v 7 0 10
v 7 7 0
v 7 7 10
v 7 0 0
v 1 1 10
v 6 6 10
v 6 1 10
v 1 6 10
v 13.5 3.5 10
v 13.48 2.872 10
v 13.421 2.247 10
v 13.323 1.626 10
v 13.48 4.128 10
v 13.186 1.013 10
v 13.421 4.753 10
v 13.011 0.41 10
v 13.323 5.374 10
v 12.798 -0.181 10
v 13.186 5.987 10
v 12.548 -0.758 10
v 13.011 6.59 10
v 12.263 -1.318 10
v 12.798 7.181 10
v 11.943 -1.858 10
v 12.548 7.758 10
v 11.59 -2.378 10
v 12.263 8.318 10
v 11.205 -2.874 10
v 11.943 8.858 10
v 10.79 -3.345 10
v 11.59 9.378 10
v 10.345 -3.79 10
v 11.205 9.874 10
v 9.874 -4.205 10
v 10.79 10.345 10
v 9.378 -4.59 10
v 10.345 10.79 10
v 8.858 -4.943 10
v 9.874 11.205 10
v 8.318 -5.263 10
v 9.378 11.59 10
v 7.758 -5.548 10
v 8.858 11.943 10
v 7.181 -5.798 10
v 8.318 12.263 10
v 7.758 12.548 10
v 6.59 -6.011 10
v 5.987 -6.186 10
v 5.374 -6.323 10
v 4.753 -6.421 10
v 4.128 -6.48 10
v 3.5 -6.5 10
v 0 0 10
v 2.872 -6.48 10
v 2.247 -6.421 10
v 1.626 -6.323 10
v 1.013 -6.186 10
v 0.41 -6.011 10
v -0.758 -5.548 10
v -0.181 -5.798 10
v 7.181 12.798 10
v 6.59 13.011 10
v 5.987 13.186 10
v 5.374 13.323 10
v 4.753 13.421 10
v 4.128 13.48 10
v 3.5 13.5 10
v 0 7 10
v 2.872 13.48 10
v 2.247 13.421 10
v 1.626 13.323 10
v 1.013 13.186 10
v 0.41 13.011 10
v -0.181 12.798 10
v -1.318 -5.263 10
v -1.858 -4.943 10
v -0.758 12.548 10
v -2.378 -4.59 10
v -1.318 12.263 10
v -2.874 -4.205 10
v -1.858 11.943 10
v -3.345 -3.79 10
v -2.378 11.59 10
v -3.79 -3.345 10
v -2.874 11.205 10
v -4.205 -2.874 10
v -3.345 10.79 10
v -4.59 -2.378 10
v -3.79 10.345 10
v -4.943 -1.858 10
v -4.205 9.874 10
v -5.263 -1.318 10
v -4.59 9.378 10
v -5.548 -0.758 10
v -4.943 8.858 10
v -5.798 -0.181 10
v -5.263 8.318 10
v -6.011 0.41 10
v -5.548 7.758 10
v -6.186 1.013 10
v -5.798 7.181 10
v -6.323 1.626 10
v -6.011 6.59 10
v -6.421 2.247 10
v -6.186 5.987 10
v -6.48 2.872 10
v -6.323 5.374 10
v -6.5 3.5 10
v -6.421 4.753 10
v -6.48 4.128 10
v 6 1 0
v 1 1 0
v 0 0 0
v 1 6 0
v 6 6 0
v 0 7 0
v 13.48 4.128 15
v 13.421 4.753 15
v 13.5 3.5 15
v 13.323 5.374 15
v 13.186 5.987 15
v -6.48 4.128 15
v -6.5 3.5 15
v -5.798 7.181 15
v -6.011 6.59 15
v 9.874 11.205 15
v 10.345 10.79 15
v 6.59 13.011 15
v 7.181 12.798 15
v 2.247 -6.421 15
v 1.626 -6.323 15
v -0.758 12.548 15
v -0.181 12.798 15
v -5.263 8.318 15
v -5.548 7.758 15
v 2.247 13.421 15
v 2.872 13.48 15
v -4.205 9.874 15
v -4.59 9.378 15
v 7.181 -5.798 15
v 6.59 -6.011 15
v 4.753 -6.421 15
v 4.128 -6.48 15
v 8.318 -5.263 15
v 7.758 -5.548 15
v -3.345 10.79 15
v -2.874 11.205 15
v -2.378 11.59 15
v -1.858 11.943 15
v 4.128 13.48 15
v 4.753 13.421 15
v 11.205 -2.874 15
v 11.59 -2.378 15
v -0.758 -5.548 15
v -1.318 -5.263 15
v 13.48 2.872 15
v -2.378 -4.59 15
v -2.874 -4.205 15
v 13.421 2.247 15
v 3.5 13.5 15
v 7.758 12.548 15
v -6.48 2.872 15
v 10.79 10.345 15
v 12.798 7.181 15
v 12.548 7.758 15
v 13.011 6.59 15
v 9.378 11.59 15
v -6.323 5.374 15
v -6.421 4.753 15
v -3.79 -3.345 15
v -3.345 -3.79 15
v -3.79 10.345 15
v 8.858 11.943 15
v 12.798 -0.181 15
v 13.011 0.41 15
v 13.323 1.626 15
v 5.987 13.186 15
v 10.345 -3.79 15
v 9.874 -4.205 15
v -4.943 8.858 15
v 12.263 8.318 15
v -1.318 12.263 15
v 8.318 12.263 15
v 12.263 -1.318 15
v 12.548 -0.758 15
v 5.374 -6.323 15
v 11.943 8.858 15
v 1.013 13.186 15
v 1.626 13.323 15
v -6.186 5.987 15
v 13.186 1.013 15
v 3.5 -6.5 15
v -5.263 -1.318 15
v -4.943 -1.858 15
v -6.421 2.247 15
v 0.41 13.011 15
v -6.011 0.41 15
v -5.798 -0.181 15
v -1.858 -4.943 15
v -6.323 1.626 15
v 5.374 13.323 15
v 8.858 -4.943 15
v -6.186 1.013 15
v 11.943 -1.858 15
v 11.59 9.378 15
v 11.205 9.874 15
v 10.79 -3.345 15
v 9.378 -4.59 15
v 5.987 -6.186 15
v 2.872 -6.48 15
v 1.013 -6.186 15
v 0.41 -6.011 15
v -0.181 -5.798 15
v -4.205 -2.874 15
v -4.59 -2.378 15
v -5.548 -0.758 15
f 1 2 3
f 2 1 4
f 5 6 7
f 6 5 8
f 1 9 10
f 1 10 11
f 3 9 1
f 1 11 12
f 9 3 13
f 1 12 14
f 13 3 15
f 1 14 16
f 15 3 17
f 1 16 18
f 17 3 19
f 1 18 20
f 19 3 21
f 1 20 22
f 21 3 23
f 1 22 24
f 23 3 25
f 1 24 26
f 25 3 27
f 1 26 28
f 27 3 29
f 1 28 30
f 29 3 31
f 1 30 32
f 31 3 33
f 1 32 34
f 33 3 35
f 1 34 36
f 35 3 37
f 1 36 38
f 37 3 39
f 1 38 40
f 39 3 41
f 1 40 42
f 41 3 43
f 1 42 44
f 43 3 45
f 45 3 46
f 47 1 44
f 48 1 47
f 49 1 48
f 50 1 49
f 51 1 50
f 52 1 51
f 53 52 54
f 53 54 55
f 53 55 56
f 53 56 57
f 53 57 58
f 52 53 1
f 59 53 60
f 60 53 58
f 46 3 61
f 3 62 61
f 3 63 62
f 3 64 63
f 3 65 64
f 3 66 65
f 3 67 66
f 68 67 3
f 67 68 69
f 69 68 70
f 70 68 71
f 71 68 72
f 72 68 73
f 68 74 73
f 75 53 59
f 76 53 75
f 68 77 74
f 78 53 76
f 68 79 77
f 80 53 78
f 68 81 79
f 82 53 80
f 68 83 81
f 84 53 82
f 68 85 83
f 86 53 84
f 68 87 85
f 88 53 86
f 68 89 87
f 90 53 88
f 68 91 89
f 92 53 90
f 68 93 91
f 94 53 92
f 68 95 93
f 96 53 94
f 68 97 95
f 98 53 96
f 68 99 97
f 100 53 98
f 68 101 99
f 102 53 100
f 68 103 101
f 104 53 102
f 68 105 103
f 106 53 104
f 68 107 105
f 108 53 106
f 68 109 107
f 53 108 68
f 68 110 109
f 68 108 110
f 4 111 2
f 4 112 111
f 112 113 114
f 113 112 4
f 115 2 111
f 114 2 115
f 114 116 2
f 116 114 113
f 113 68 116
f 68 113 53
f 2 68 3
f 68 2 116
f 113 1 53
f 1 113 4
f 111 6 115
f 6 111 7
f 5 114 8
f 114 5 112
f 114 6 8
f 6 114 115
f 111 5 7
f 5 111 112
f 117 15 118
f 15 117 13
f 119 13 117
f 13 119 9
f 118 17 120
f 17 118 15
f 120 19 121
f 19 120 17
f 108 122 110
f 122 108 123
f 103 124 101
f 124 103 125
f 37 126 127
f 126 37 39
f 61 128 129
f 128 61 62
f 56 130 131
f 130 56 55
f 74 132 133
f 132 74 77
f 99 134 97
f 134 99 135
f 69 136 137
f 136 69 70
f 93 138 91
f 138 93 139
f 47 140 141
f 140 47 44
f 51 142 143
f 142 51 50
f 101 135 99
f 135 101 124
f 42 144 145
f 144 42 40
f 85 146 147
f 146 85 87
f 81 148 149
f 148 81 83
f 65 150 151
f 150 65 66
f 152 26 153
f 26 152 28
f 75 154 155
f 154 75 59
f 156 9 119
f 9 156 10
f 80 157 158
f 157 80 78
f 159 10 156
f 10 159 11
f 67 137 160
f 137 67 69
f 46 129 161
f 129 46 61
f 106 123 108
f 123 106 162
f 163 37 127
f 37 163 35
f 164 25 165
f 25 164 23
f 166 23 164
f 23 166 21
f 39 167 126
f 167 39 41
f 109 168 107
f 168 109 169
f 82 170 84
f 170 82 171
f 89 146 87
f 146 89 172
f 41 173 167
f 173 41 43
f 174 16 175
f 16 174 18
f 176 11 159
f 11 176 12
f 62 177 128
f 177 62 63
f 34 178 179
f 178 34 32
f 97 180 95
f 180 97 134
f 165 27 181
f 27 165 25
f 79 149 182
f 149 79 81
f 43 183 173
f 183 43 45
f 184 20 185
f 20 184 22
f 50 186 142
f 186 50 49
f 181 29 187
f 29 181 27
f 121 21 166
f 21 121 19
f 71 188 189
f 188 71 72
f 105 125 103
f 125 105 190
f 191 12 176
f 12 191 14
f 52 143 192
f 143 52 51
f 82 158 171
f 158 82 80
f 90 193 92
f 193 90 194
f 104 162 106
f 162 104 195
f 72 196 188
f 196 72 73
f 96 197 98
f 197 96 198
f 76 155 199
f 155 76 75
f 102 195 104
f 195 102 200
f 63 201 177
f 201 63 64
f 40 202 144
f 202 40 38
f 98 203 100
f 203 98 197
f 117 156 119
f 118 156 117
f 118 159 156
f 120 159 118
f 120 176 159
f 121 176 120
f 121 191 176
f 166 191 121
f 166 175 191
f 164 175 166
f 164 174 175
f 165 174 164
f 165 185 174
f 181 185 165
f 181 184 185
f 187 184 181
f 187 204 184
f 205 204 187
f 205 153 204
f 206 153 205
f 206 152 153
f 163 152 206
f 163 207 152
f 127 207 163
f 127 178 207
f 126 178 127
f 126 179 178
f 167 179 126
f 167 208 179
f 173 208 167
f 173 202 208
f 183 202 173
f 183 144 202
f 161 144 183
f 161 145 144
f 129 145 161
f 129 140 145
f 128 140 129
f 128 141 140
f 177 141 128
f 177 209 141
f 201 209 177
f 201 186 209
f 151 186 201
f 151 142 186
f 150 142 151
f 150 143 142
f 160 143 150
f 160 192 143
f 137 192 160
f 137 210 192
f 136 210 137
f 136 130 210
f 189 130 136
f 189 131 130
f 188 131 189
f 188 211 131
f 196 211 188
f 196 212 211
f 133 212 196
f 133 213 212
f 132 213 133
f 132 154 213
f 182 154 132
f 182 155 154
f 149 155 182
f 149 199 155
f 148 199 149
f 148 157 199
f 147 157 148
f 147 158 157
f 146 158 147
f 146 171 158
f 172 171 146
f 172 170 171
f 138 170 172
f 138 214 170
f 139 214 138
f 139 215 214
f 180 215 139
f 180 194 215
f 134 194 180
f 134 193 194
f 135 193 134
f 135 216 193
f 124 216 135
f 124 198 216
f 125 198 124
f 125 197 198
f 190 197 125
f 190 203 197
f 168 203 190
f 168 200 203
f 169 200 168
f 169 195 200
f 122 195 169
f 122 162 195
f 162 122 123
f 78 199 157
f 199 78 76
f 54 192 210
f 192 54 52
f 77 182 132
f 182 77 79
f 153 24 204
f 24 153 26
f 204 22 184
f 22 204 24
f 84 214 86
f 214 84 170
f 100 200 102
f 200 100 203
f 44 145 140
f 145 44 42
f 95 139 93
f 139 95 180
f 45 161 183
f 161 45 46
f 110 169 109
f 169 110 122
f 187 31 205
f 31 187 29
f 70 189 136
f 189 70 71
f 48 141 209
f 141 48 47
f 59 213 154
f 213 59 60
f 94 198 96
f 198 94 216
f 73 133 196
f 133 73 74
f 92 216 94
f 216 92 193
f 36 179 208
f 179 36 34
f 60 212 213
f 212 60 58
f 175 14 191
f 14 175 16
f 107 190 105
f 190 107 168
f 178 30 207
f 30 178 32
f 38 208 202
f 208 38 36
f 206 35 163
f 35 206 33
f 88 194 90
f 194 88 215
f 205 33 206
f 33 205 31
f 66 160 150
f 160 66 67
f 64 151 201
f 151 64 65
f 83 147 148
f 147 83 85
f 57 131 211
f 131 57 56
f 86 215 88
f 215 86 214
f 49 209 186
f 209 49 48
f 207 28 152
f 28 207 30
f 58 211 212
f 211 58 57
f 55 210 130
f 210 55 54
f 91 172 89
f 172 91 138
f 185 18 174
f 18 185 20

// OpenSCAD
$fn=100; // kinda like resolution (makes the cylinder more smooth on the sides)


// cube to put on the button
difference () { 
#    cube([7, 7, 10]);
    
// make it hollow
    translate([1, 1, 0]) {
        cube([5, 5, 10]);
    }
}
    
// cylinder that sits on the cube  
translate([3.5, 3.5, 10]) {
#   cylinder(h = 5, r = 10);  
}
